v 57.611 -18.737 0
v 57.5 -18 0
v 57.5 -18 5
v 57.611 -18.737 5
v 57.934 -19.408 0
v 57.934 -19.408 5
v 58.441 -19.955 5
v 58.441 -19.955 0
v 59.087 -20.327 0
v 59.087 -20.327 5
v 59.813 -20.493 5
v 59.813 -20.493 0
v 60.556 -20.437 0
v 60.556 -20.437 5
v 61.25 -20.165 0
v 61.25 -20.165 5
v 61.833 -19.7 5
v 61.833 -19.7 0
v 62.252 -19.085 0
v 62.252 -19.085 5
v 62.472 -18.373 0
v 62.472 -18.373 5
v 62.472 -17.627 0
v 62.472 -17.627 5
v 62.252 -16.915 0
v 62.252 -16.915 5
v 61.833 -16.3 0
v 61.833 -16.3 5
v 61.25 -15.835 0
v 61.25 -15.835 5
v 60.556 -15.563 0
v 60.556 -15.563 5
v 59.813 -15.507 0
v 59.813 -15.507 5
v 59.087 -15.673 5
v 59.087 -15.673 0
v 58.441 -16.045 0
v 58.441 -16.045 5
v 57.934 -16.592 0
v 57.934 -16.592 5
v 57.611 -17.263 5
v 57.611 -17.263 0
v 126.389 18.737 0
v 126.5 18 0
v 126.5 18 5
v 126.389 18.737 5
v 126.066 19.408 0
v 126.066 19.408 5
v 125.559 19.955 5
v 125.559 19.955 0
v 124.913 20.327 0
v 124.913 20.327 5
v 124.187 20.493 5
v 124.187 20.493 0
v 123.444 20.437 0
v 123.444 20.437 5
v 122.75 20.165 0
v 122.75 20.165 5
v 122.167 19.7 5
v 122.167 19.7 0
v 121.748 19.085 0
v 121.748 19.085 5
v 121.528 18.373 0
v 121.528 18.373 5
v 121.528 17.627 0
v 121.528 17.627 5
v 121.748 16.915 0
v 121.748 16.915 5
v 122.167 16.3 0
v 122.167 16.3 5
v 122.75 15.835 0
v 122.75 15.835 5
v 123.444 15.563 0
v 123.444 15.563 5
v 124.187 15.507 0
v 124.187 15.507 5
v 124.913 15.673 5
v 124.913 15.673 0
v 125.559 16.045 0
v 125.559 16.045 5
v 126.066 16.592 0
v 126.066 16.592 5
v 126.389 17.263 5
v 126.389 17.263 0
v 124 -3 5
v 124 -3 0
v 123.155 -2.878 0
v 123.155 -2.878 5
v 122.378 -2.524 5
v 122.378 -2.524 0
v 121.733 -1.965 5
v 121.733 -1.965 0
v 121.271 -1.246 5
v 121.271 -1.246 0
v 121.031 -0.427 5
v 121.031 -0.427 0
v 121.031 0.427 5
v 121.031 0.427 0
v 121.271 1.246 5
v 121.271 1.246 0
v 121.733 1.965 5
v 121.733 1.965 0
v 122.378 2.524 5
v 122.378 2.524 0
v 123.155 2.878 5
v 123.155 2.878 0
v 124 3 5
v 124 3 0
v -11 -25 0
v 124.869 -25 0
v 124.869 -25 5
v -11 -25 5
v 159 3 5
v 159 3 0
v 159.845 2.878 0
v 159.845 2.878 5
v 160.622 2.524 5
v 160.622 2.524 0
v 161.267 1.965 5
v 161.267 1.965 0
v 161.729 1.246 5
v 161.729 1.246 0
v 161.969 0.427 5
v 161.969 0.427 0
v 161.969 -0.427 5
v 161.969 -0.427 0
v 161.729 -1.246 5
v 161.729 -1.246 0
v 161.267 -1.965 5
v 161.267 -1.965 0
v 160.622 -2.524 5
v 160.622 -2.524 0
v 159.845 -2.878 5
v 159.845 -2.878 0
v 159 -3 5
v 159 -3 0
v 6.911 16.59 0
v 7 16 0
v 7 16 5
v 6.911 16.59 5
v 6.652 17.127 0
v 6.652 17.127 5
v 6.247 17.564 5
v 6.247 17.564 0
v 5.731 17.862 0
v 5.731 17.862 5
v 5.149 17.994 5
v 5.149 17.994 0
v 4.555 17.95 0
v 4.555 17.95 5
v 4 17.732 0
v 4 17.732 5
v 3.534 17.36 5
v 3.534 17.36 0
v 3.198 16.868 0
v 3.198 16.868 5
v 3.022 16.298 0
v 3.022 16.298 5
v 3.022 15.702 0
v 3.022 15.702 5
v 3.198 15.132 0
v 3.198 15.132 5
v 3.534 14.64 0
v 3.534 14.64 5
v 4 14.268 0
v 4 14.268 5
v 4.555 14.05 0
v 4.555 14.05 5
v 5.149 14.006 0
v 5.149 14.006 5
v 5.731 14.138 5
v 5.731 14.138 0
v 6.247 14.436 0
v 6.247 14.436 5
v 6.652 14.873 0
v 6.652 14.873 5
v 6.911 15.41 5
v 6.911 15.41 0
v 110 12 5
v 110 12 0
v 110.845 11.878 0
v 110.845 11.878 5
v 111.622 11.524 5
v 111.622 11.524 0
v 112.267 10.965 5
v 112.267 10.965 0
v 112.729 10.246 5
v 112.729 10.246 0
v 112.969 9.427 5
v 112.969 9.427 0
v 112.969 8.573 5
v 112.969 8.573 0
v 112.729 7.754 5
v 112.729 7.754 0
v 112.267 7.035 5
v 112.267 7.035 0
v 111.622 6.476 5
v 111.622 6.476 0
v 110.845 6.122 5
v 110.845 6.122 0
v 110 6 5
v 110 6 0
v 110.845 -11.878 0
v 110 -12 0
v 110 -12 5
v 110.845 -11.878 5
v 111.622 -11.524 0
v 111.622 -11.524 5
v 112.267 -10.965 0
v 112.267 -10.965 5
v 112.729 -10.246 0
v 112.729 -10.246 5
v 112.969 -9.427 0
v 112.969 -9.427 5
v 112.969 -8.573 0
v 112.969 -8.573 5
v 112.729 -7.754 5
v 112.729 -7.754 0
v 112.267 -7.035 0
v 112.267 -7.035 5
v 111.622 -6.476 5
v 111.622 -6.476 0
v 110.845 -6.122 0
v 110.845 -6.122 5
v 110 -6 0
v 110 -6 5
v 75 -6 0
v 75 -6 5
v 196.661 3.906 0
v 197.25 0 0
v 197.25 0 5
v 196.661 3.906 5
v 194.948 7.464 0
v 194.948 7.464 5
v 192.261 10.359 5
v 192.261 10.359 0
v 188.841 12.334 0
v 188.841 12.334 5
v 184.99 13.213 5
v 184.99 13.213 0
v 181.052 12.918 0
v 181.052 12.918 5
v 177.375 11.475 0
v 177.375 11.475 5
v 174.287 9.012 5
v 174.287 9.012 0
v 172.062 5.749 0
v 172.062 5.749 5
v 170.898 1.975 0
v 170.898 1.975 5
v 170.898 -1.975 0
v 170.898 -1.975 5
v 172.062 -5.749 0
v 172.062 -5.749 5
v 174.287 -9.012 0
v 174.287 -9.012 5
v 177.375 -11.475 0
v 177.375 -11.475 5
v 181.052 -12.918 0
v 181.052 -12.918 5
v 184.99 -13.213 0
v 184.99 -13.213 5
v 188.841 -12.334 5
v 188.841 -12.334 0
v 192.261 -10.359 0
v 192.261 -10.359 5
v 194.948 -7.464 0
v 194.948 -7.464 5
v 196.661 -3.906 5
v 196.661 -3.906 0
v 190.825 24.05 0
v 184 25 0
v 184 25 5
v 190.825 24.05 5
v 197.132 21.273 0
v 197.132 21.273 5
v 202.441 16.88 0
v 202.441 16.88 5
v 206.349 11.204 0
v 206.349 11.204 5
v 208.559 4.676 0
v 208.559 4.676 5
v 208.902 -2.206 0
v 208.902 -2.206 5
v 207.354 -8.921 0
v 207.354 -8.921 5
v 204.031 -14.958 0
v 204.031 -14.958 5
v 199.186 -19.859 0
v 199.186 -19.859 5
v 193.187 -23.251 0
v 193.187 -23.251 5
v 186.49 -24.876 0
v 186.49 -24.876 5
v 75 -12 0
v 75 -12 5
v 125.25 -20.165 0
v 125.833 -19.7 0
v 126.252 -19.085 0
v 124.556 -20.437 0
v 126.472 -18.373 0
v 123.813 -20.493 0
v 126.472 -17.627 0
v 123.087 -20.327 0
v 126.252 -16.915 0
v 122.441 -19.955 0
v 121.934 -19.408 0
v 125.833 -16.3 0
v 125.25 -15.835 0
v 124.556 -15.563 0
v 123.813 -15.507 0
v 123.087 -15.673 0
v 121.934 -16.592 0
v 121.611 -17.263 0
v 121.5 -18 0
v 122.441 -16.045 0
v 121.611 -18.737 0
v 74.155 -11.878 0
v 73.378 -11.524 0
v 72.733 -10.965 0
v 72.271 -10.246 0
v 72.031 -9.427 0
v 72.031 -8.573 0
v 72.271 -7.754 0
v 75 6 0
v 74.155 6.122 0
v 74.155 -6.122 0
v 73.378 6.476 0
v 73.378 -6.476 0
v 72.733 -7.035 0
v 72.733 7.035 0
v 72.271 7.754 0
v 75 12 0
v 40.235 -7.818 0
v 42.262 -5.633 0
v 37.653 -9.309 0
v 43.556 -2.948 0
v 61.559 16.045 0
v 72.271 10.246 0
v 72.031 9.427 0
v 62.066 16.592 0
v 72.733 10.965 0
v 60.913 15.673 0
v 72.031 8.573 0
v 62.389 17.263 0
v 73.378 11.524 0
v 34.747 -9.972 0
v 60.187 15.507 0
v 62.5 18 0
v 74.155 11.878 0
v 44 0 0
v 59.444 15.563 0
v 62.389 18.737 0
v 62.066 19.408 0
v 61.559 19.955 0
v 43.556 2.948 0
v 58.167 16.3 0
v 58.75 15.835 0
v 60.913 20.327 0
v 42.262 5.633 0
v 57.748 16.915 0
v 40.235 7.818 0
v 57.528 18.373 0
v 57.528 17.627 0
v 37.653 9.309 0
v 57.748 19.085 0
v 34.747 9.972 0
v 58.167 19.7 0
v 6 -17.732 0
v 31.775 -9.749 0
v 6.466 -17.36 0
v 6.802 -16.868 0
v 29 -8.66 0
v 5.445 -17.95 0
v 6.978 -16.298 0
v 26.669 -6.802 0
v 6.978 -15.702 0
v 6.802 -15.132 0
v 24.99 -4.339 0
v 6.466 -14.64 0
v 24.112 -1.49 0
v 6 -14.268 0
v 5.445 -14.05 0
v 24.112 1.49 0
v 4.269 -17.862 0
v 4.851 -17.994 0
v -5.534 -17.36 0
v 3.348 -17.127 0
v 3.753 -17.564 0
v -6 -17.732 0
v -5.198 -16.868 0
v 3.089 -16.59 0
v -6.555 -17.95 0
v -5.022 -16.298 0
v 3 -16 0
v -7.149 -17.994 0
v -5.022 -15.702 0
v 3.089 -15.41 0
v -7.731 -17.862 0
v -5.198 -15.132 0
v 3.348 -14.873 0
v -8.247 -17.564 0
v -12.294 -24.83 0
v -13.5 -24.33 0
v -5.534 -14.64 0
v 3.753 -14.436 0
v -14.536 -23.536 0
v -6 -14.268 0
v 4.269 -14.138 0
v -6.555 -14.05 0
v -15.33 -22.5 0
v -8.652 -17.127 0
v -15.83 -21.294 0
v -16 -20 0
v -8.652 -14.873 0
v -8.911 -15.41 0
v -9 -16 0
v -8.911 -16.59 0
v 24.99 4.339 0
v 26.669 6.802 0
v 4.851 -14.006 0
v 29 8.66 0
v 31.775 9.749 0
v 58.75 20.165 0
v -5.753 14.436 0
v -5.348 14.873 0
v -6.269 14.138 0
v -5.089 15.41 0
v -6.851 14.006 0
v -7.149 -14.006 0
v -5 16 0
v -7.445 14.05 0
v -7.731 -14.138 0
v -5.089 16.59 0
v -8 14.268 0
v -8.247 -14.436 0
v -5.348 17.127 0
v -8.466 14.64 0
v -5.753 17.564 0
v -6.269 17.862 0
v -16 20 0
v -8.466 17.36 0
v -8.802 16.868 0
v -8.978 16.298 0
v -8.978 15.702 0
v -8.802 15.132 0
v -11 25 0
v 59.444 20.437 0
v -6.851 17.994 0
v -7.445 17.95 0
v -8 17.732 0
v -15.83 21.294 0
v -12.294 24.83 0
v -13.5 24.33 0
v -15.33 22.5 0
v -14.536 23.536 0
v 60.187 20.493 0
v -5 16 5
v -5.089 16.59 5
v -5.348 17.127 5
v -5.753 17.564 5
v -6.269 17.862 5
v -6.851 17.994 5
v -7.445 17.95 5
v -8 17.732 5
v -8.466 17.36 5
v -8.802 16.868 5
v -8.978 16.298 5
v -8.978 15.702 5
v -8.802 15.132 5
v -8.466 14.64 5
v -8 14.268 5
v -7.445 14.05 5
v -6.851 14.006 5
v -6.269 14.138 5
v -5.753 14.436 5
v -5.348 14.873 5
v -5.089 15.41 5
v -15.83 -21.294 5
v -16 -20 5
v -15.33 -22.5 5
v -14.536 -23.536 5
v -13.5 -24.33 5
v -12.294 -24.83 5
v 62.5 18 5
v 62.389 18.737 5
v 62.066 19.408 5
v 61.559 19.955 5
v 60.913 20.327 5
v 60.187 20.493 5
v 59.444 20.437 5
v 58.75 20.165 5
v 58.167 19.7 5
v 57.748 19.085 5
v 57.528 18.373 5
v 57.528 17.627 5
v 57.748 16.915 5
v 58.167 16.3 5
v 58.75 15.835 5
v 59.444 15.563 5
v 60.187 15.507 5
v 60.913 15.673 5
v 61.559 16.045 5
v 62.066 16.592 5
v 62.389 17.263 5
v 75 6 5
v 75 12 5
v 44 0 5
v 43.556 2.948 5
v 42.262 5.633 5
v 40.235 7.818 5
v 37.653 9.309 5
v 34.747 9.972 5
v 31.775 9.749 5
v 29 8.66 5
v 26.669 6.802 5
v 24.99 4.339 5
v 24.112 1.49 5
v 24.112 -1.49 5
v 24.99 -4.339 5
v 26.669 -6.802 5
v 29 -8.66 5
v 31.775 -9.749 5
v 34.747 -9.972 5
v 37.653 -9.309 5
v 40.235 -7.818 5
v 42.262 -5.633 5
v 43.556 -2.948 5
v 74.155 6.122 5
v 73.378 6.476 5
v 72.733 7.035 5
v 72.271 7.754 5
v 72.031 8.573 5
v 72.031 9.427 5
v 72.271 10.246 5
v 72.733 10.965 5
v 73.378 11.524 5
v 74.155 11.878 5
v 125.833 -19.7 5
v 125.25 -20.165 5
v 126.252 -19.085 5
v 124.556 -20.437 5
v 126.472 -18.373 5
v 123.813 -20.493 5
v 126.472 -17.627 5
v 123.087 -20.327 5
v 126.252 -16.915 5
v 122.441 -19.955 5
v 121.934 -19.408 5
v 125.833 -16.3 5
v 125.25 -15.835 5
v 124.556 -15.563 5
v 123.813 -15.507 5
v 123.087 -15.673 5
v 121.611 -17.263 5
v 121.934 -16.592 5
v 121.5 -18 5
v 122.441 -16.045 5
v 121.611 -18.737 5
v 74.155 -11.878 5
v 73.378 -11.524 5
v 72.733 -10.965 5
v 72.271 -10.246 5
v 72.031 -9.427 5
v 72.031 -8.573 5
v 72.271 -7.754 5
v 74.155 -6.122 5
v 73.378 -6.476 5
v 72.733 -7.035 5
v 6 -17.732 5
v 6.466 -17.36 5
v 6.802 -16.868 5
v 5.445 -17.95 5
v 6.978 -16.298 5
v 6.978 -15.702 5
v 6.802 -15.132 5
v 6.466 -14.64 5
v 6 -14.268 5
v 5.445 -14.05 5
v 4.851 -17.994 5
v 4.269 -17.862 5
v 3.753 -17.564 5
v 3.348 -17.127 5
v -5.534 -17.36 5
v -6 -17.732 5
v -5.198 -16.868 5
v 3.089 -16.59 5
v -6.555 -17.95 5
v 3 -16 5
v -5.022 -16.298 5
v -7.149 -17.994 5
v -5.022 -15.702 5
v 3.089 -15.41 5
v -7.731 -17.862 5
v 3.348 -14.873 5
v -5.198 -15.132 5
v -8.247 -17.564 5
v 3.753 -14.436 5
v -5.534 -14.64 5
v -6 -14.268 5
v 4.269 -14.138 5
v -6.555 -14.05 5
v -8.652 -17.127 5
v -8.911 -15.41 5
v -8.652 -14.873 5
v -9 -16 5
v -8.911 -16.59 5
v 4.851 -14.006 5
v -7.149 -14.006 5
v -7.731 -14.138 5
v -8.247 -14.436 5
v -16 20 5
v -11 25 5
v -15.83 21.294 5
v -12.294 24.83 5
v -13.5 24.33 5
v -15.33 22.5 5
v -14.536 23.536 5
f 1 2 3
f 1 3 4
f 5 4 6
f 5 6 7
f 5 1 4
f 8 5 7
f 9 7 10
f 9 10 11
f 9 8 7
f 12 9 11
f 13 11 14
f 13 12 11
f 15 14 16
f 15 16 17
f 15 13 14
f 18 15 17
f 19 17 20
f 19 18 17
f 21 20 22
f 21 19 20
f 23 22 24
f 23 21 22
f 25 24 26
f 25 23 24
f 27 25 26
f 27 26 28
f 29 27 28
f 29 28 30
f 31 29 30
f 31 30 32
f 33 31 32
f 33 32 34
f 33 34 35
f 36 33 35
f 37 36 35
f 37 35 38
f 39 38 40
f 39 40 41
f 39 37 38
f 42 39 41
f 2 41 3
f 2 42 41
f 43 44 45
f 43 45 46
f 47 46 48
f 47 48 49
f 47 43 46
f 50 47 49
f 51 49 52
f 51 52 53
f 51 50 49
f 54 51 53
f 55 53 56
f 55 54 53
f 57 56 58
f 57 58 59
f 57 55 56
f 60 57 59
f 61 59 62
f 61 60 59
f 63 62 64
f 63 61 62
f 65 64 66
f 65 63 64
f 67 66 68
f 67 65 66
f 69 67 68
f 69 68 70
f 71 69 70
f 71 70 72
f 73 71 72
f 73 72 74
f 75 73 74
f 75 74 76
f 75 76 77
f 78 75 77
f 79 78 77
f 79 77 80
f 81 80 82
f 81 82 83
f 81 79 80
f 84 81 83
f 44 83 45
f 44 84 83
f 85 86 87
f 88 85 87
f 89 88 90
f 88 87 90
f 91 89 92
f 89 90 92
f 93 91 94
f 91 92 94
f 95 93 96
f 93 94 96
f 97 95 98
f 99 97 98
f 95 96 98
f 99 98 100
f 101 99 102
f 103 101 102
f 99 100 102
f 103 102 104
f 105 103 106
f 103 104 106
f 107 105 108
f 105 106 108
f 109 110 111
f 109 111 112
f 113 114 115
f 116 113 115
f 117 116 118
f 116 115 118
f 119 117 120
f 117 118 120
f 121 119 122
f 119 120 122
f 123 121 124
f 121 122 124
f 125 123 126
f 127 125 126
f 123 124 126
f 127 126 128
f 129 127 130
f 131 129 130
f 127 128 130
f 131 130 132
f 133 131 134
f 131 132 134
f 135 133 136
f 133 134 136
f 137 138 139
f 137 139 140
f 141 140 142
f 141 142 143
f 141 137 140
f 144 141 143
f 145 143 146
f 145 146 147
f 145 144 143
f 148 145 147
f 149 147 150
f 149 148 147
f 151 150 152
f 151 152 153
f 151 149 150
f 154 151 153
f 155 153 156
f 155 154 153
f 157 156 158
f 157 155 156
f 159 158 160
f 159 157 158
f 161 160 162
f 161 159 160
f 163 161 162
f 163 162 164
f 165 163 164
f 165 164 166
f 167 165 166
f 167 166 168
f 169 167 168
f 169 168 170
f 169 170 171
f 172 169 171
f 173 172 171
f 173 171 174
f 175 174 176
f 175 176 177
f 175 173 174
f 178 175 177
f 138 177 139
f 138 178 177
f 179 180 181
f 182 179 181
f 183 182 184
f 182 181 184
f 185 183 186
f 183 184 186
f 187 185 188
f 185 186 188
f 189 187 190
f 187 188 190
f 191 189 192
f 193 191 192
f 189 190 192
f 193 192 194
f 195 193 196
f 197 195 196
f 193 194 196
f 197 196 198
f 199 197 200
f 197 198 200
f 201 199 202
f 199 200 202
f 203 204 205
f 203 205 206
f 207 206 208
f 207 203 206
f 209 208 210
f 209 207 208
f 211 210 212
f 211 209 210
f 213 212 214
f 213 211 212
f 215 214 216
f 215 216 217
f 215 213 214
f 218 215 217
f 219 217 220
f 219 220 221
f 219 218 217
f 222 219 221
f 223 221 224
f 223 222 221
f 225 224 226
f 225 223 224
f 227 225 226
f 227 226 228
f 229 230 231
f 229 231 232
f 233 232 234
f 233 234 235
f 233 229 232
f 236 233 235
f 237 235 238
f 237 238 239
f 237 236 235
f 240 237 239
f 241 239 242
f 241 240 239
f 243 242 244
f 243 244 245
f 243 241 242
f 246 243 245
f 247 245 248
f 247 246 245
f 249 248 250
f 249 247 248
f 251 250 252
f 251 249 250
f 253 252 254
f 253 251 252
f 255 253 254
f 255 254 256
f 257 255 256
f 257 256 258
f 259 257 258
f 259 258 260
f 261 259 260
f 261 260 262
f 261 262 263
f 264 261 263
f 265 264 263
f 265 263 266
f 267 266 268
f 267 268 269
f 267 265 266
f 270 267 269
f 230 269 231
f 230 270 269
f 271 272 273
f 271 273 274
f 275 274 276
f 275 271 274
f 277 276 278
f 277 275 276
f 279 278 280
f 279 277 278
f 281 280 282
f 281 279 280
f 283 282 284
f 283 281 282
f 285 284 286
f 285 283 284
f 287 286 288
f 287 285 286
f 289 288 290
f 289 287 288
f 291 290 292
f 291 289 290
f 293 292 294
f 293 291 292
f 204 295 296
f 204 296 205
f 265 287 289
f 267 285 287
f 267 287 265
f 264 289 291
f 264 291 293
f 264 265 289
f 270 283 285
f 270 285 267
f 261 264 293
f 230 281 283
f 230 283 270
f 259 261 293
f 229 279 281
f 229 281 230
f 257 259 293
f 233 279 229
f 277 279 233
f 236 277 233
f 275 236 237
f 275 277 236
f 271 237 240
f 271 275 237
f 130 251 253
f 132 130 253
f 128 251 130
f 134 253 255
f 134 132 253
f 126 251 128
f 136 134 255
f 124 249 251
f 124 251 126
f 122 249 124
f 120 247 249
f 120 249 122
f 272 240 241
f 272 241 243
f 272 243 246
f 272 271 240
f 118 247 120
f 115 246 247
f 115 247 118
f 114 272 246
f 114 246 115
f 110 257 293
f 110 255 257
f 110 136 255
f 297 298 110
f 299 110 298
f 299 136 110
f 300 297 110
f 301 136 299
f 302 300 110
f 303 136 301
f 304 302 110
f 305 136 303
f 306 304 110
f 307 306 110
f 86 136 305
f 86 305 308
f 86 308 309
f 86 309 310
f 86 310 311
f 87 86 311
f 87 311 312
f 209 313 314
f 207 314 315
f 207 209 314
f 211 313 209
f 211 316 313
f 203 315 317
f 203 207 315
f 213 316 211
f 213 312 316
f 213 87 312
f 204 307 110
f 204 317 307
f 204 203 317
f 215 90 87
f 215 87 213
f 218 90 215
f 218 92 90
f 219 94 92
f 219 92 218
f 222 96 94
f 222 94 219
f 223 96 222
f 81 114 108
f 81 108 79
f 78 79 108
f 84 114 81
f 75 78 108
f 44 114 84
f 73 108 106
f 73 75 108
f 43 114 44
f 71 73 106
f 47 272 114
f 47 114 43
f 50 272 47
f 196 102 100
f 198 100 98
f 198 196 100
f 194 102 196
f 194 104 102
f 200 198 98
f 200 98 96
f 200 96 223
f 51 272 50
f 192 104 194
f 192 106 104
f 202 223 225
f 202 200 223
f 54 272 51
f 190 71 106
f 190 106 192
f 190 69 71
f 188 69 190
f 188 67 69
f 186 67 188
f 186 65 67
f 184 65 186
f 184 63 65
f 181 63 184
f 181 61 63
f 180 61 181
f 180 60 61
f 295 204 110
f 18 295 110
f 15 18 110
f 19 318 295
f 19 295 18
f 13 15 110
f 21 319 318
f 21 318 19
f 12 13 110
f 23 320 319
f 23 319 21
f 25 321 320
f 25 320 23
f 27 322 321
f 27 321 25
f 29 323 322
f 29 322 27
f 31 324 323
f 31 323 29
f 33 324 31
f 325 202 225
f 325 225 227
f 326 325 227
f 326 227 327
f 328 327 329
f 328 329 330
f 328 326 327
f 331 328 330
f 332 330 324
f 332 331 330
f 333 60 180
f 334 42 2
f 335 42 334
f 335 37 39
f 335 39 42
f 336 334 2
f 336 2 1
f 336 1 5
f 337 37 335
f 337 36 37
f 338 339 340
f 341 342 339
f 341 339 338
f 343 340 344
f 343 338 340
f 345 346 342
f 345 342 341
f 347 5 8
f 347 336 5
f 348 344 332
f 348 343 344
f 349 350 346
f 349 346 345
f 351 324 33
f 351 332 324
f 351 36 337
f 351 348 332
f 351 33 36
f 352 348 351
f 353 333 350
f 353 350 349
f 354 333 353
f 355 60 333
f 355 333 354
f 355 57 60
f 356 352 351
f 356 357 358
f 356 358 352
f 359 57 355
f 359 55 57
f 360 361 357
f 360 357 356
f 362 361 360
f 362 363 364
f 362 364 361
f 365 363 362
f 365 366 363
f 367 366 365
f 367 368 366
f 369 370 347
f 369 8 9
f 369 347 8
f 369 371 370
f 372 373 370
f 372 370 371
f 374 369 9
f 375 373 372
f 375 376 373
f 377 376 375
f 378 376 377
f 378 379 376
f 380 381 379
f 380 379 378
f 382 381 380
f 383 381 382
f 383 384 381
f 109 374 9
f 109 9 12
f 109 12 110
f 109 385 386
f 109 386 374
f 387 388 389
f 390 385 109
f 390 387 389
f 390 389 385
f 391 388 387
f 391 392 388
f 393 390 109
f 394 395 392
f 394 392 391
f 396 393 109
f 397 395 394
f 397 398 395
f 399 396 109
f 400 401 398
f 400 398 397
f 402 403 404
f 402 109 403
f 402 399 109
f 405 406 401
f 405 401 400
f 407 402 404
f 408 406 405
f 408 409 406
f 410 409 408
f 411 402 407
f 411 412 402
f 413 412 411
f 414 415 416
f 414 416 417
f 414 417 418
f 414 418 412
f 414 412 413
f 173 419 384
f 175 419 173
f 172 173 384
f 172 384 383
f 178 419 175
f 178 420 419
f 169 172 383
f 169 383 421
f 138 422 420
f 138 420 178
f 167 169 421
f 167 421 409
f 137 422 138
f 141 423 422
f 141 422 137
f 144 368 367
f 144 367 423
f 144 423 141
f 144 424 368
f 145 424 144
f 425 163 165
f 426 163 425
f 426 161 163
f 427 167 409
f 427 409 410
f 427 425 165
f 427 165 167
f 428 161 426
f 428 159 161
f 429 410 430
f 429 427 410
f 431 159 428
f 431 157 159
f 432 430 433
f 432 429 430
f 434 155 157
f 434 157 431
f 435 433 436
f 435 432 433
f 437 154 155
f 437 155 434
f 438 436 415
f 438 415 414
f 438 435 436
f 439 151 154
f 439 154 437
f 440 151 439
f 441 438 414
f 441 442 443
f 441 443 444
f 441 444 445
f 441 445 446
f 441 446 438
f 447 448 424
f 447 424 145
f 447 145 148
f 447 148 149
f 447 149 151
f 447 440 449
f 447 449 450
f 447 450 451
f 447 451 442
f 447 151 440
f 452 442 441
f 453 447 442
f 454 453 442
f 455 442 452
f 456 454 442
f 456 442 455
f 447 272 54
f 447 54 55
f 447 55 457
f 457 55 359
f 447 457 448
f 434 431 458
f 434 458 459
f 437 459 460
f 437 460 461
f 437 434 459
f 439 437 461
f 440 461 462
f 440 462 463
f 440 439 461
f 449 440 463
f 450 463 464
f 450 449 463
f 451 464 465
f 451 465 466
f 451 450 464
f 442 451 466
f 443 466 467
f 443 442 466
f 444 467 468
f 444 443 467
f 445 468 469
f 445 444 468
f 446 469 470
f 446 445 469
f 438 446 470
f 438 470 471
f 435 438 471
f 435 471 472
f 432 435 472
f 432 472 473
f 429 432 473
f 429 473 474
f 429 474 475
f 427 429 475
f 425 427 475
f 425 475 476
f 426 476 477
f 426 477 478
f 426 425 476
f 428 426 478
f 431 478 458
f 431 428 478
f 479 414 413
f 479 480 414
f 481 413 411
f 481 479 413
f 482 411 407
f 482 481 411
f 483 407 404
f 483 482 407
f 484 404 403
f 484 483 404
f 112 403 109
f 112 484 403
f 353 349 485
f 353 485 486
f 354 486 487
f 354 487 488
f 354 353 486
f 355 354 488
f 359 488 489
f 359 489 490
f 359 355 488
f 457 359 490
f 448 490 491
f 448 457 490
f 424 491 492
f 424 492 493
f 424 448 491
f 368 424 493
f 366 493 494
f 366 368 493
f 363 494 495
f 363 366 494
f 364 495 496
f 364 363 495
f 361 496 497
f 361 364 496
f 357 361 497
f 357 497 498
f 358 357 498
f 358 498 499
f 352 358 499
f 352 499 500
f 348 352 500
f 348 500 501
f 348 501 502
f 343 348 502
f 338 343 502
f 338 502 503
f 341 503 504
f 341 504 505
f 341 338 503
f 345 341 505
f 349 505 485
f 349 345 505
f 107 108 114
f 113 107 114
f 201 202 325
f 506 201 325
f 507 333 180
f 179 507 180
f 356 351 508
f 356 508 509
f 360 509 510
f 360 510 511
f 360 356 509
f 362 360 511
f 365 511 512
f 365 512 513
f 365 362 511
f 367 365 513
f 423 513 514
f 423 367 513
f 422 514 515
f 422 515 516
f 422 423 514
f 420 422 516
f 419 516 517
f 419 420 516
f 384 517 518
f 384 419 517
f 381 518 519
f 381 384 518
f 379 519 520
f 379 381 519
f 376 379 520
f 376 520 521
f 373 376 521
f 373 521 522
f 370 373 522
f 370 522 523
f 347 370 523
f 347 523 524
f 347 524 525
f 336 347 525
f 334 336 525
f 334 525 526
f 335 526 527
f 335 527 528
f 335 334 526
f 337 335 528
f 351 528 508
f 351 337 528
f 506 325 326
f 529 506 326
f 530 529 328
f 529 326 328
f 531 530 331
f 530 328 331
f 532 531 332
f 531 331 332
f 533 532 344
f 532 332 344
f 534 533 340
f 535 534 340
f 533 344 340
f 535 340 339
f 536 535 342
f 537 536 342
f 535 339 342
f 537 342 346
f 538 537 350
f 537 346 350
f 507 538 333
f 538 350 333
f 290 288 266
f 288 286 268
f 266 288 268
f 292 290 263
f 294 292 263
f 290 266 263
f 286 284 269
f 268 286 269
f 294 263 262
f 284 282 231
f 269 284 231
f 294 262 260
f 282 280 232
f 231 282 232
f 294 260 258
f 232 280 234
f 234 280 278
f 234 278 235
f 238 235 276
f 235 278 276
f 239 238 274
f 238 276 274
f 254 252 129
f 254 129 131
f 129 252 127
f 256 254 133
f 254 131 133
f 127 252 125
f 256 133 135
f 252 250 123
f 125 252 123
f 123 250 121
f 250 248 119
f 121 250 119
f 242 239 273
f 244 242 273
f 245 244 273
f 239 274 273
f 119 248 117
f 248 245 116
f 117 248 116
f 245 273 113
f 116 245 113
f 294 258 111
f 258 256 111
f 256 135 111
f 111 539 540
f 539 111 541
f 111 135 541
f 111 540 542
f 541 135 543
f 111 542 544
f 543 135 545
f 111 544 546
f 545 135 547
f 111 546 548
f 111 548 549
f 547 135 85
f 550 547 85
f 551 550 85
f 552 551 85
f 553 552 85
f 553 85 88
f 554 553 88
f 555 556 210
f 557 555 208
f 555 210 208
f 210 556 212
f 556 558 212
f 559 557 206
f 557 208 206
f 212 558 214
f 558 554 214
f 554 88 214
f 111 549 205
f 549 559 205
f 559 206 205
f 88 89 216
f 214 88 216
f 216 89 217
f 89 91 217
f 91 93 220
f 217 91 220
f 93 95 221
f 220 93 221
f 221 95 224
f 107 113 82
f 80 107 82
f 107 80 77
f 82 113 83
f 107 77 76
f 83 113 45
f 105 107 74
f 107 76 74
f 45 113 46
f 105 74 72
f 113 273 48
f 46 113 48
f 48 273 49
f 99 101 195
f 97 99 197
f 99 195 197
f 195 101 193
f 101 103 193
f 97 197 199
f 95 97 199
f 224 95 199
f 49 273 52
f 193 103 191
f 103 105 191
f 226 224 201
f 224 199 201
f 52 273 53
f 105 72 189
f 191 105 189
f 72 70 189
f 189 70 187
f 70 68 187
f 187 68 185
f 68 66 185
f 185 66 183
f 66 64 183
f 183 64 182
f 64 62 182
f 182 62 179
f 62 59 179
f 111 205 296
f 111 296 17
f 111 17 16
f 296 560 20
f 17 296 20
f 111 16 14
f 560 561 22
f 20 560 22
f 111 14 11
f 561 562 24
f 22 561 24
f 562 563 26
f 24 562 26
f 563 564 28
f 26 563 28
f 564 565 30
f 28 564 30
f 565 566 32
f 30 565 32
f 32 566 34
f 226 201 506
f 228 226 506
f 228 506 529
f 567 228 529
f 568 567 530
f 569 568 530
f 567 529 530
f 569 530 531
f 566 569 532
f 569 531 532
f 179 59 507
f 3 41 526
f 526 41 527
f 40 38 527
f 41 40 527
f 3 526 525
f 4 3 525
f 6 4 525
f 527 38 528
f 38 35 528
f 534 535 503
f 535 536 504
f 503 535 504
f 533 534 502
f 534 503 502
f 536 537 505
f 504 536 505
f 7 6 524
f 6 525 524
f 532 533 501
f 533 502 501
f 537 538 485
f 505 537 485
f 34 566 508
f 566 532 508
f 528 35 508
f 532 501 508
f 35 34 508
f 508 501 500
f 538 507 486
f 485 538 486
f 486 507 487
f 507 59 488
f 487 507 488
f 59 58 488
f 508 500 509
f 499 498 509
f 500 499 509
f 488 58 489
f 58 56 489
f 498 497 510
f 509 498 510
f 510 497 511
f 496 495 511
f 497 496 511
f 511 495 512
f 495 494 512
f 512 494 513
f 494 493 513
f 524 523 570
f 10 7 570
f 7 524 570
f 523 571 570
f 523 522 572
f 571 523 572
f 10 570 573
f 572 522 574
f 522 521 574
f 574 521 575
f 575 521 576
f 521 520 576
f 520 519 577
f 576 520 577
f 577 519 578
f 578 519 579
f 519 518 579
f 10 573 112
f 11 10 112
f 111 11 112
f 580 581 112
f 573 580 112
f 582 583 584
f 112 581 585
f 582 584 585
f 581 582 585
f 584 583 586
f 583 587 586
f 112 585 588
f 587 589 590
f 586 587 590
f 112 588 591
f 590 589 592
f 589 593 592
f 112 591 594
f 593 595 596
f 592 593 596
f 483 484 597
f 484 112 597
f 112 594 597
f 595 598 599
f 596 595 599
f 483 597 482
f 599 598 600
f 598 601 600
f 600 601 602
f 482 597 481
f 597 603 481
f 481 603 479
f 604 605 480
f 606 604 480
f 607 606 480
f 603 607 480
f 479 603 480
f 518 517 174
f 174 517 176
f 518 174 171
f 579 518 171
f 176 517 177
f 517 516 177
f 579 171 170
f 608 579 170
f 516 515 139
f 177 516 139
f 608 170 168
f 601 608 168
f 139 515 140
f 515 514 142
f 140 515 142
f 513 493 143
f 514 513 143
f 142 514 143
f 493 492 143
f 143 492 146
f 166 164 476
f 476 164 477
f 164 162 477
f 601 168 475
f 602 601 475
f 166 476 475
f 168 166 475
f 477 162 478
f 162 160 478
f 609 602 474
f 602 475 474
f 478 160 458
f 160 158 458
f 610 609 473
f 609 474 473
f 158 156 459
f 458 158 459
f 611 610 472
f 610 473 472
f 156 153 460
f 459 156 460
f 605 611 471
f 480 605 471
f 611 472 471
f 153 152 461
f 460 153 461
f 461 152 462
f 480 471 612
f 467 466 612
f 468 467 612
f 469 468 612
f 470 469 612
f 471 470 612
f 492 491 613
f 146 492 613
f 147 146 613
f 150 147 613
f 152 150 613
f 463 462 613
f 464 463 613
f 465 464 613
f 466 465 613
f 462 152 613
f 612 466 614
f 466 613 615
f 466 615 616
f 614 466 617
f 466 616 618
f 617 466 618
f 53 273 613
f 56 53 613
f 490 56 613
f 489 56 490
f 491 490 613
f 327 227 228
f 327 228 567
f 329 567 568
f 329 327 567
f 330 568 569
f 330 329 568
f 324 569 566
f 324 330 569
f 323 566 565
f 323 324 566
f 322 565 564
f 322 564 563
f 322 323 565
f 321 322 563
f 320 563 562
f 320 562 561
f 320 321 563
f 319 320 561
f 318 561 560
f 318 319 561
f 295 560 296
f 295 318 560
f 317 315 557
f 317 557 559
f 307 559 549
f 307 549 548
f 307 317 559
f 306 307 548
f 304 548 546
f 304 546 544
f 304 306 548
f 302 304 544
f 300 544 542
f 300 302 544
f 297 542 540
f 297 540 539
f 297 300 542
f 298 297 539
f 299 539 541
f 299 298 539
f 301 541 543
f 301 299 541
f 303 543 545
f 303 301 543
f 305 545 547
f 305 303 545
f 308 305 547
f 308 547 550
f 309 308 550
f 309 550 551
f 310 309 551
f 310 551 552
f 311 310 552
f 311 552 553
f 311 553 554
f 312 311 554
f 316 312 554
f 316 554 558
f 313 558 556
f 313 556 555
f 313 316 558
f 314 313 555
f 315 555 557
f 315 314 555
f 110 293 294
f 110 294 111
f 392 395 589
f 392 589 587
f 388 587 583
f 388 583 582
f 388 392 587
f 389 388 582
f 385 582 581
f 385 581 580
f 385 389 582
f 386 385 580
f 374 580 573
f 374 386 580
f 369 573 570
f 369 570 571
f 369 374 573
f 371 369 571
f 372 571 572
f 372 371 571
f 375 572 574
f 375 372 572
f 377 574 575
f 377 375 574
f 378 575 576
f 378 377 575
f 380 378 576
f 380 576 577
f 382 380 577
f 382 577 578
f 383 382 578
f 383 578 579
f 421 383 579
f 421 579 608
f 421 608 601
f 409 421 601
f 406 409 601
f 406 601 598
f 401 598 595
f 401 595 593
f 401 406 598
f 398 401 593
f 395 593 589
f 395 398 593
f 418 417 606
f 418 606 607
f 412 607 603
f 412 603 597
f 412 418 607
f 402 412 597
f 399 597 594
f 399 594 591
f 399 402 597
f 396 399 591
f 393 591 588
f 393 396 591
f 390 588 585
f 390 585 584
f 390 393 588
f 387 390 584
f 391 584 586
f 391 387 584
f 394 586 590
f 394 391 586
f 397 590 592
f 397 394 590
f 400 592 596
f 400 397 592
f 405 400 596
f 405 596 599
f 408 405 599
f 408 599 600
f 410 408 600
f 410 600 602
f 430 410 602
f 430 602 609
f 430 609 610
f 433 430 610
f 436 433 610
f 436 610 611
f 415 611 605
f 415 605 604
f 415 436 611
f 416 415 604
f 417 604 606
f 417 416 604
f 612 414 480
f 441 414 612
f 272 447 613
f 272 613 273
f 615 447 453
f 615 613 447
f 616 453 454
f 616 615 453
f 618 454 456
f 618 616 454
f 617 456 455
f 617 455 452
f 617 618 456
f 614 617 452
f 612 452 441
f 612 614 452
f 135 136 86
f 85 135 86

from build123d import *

# Parameters (mm, degrees)
SKETCH_1_R      = 13.25
SKETCH_1_R_2    = 2
SKETCH_1_R_3    = 2.5
SKETCH_1_R_4    = 10
EXTRUDE_1_DEPTH = 5
FILLET_1_R      = 5


with BuildPart() as part:
    # 草图1 → 凸台-拉伸1 (new body)
    with BuildSketch(Plane.XY):
        with BuildLine():
            Line((0, 25), (124.869292101, 25))
            Line((124.869292101, 25), (184, 25))
            ThreePointArc((184, 25), (208.968890762, 1.246793543), (186.490484142, -24.875640469))
            Line((186.490484142, -24.875640469), (124.869292101, -25))
            Line((124.869292101, -25), (0, -25))
            Line((0, -25), (-16, -25))
            Line((-16, -25), (-16, 25))
            Line((-16, 25), (0, 25))
        make_face()
        with Locations((184, 0)):
            Circle(SKETCH_1_R, mode=Mode.SUBTRACT)
        with Locations((5, 16)):
            Circle(SKETCH_1_R_2, mode=Mode.SUBTRACT)
        with Locations(Location((5, -16, 0), (0, 0, 180))):
            Circle(SKETCH_1_R_2, mode=Mode.SUBTRACT)
        with Locations((60, 18)):
            Circle(SKETCH_1_R_3, mode=Mode.SUBTRACT)
        with Locations((124, 18)):
            Circle(SKETCH_1_R_3, mode=Mode.SUBTRACT)
        with Locations((34, 0)):
            Circle(SKETCH_1_R_4, mode=Mode.SUBTRACT)
        with Locations(Location((124, -18, 0), (0, 0, 180))):
            Circle(SKETCH_1_R_3, mode=Mode.SUBTRACT)
        with Locations(Location((60, -18, 0), (0, 0, 180))):
            Circle(SKETCH_1_R_3, mode=Mode.SUBTRACT)
        with Locations((-7, 16)):
            Circle(SKETCH_1_R_2, mode=Mode.SUBTRACT)
        with Locations(Location((-7, -16, 0), (0, 0, 180))):
            Circle(SKETCH_1_R_2, mode=Mode.SUBTRACT)
        with BuildLine():
            Line((75, 12), (110, 12))
            ThreePointArc((110, 12), (113, 9), (110, 6))
            Line((110, 6), (75, 6))
            ThreePointArc((75, 6), (72, 9), (75, 12))
        make_face(mode=Mode.SUBTRACT)
        with BuildLine():
            Line((75, -12), (110, -12))
            ThreePointArc((110, -12), (113, -9), (110, -6))
            Line((110, -6), (75, -6))
            ThreePointArc((75, -6), (72, -9), (75, -12))
        make_face(mode=Mode.SUBTRACT)
        with BuildLine():
            Line((124, 3), (159, 3))
            ThreePointArc((159, 3), (162, 0), (159, -3))
            Line((159, -3), (124, -3))
            ThreePointArc((124, -3), (121, 0), (124, 3))
        make_face(mode=Mode.SUBTRACT)
    extrude(amount=EXTRUDE_1_DEPTH)

    # 圆角1
    fillet_1_edges = [part.edges().sort_by_distance(p)[0] for p in [
        (-16, -25, 2.5),
        (-16, 25, 2.5),
    ]]
    fillet(fillet_1_edges, radius=FILLET_1_R)


solid = part.part
